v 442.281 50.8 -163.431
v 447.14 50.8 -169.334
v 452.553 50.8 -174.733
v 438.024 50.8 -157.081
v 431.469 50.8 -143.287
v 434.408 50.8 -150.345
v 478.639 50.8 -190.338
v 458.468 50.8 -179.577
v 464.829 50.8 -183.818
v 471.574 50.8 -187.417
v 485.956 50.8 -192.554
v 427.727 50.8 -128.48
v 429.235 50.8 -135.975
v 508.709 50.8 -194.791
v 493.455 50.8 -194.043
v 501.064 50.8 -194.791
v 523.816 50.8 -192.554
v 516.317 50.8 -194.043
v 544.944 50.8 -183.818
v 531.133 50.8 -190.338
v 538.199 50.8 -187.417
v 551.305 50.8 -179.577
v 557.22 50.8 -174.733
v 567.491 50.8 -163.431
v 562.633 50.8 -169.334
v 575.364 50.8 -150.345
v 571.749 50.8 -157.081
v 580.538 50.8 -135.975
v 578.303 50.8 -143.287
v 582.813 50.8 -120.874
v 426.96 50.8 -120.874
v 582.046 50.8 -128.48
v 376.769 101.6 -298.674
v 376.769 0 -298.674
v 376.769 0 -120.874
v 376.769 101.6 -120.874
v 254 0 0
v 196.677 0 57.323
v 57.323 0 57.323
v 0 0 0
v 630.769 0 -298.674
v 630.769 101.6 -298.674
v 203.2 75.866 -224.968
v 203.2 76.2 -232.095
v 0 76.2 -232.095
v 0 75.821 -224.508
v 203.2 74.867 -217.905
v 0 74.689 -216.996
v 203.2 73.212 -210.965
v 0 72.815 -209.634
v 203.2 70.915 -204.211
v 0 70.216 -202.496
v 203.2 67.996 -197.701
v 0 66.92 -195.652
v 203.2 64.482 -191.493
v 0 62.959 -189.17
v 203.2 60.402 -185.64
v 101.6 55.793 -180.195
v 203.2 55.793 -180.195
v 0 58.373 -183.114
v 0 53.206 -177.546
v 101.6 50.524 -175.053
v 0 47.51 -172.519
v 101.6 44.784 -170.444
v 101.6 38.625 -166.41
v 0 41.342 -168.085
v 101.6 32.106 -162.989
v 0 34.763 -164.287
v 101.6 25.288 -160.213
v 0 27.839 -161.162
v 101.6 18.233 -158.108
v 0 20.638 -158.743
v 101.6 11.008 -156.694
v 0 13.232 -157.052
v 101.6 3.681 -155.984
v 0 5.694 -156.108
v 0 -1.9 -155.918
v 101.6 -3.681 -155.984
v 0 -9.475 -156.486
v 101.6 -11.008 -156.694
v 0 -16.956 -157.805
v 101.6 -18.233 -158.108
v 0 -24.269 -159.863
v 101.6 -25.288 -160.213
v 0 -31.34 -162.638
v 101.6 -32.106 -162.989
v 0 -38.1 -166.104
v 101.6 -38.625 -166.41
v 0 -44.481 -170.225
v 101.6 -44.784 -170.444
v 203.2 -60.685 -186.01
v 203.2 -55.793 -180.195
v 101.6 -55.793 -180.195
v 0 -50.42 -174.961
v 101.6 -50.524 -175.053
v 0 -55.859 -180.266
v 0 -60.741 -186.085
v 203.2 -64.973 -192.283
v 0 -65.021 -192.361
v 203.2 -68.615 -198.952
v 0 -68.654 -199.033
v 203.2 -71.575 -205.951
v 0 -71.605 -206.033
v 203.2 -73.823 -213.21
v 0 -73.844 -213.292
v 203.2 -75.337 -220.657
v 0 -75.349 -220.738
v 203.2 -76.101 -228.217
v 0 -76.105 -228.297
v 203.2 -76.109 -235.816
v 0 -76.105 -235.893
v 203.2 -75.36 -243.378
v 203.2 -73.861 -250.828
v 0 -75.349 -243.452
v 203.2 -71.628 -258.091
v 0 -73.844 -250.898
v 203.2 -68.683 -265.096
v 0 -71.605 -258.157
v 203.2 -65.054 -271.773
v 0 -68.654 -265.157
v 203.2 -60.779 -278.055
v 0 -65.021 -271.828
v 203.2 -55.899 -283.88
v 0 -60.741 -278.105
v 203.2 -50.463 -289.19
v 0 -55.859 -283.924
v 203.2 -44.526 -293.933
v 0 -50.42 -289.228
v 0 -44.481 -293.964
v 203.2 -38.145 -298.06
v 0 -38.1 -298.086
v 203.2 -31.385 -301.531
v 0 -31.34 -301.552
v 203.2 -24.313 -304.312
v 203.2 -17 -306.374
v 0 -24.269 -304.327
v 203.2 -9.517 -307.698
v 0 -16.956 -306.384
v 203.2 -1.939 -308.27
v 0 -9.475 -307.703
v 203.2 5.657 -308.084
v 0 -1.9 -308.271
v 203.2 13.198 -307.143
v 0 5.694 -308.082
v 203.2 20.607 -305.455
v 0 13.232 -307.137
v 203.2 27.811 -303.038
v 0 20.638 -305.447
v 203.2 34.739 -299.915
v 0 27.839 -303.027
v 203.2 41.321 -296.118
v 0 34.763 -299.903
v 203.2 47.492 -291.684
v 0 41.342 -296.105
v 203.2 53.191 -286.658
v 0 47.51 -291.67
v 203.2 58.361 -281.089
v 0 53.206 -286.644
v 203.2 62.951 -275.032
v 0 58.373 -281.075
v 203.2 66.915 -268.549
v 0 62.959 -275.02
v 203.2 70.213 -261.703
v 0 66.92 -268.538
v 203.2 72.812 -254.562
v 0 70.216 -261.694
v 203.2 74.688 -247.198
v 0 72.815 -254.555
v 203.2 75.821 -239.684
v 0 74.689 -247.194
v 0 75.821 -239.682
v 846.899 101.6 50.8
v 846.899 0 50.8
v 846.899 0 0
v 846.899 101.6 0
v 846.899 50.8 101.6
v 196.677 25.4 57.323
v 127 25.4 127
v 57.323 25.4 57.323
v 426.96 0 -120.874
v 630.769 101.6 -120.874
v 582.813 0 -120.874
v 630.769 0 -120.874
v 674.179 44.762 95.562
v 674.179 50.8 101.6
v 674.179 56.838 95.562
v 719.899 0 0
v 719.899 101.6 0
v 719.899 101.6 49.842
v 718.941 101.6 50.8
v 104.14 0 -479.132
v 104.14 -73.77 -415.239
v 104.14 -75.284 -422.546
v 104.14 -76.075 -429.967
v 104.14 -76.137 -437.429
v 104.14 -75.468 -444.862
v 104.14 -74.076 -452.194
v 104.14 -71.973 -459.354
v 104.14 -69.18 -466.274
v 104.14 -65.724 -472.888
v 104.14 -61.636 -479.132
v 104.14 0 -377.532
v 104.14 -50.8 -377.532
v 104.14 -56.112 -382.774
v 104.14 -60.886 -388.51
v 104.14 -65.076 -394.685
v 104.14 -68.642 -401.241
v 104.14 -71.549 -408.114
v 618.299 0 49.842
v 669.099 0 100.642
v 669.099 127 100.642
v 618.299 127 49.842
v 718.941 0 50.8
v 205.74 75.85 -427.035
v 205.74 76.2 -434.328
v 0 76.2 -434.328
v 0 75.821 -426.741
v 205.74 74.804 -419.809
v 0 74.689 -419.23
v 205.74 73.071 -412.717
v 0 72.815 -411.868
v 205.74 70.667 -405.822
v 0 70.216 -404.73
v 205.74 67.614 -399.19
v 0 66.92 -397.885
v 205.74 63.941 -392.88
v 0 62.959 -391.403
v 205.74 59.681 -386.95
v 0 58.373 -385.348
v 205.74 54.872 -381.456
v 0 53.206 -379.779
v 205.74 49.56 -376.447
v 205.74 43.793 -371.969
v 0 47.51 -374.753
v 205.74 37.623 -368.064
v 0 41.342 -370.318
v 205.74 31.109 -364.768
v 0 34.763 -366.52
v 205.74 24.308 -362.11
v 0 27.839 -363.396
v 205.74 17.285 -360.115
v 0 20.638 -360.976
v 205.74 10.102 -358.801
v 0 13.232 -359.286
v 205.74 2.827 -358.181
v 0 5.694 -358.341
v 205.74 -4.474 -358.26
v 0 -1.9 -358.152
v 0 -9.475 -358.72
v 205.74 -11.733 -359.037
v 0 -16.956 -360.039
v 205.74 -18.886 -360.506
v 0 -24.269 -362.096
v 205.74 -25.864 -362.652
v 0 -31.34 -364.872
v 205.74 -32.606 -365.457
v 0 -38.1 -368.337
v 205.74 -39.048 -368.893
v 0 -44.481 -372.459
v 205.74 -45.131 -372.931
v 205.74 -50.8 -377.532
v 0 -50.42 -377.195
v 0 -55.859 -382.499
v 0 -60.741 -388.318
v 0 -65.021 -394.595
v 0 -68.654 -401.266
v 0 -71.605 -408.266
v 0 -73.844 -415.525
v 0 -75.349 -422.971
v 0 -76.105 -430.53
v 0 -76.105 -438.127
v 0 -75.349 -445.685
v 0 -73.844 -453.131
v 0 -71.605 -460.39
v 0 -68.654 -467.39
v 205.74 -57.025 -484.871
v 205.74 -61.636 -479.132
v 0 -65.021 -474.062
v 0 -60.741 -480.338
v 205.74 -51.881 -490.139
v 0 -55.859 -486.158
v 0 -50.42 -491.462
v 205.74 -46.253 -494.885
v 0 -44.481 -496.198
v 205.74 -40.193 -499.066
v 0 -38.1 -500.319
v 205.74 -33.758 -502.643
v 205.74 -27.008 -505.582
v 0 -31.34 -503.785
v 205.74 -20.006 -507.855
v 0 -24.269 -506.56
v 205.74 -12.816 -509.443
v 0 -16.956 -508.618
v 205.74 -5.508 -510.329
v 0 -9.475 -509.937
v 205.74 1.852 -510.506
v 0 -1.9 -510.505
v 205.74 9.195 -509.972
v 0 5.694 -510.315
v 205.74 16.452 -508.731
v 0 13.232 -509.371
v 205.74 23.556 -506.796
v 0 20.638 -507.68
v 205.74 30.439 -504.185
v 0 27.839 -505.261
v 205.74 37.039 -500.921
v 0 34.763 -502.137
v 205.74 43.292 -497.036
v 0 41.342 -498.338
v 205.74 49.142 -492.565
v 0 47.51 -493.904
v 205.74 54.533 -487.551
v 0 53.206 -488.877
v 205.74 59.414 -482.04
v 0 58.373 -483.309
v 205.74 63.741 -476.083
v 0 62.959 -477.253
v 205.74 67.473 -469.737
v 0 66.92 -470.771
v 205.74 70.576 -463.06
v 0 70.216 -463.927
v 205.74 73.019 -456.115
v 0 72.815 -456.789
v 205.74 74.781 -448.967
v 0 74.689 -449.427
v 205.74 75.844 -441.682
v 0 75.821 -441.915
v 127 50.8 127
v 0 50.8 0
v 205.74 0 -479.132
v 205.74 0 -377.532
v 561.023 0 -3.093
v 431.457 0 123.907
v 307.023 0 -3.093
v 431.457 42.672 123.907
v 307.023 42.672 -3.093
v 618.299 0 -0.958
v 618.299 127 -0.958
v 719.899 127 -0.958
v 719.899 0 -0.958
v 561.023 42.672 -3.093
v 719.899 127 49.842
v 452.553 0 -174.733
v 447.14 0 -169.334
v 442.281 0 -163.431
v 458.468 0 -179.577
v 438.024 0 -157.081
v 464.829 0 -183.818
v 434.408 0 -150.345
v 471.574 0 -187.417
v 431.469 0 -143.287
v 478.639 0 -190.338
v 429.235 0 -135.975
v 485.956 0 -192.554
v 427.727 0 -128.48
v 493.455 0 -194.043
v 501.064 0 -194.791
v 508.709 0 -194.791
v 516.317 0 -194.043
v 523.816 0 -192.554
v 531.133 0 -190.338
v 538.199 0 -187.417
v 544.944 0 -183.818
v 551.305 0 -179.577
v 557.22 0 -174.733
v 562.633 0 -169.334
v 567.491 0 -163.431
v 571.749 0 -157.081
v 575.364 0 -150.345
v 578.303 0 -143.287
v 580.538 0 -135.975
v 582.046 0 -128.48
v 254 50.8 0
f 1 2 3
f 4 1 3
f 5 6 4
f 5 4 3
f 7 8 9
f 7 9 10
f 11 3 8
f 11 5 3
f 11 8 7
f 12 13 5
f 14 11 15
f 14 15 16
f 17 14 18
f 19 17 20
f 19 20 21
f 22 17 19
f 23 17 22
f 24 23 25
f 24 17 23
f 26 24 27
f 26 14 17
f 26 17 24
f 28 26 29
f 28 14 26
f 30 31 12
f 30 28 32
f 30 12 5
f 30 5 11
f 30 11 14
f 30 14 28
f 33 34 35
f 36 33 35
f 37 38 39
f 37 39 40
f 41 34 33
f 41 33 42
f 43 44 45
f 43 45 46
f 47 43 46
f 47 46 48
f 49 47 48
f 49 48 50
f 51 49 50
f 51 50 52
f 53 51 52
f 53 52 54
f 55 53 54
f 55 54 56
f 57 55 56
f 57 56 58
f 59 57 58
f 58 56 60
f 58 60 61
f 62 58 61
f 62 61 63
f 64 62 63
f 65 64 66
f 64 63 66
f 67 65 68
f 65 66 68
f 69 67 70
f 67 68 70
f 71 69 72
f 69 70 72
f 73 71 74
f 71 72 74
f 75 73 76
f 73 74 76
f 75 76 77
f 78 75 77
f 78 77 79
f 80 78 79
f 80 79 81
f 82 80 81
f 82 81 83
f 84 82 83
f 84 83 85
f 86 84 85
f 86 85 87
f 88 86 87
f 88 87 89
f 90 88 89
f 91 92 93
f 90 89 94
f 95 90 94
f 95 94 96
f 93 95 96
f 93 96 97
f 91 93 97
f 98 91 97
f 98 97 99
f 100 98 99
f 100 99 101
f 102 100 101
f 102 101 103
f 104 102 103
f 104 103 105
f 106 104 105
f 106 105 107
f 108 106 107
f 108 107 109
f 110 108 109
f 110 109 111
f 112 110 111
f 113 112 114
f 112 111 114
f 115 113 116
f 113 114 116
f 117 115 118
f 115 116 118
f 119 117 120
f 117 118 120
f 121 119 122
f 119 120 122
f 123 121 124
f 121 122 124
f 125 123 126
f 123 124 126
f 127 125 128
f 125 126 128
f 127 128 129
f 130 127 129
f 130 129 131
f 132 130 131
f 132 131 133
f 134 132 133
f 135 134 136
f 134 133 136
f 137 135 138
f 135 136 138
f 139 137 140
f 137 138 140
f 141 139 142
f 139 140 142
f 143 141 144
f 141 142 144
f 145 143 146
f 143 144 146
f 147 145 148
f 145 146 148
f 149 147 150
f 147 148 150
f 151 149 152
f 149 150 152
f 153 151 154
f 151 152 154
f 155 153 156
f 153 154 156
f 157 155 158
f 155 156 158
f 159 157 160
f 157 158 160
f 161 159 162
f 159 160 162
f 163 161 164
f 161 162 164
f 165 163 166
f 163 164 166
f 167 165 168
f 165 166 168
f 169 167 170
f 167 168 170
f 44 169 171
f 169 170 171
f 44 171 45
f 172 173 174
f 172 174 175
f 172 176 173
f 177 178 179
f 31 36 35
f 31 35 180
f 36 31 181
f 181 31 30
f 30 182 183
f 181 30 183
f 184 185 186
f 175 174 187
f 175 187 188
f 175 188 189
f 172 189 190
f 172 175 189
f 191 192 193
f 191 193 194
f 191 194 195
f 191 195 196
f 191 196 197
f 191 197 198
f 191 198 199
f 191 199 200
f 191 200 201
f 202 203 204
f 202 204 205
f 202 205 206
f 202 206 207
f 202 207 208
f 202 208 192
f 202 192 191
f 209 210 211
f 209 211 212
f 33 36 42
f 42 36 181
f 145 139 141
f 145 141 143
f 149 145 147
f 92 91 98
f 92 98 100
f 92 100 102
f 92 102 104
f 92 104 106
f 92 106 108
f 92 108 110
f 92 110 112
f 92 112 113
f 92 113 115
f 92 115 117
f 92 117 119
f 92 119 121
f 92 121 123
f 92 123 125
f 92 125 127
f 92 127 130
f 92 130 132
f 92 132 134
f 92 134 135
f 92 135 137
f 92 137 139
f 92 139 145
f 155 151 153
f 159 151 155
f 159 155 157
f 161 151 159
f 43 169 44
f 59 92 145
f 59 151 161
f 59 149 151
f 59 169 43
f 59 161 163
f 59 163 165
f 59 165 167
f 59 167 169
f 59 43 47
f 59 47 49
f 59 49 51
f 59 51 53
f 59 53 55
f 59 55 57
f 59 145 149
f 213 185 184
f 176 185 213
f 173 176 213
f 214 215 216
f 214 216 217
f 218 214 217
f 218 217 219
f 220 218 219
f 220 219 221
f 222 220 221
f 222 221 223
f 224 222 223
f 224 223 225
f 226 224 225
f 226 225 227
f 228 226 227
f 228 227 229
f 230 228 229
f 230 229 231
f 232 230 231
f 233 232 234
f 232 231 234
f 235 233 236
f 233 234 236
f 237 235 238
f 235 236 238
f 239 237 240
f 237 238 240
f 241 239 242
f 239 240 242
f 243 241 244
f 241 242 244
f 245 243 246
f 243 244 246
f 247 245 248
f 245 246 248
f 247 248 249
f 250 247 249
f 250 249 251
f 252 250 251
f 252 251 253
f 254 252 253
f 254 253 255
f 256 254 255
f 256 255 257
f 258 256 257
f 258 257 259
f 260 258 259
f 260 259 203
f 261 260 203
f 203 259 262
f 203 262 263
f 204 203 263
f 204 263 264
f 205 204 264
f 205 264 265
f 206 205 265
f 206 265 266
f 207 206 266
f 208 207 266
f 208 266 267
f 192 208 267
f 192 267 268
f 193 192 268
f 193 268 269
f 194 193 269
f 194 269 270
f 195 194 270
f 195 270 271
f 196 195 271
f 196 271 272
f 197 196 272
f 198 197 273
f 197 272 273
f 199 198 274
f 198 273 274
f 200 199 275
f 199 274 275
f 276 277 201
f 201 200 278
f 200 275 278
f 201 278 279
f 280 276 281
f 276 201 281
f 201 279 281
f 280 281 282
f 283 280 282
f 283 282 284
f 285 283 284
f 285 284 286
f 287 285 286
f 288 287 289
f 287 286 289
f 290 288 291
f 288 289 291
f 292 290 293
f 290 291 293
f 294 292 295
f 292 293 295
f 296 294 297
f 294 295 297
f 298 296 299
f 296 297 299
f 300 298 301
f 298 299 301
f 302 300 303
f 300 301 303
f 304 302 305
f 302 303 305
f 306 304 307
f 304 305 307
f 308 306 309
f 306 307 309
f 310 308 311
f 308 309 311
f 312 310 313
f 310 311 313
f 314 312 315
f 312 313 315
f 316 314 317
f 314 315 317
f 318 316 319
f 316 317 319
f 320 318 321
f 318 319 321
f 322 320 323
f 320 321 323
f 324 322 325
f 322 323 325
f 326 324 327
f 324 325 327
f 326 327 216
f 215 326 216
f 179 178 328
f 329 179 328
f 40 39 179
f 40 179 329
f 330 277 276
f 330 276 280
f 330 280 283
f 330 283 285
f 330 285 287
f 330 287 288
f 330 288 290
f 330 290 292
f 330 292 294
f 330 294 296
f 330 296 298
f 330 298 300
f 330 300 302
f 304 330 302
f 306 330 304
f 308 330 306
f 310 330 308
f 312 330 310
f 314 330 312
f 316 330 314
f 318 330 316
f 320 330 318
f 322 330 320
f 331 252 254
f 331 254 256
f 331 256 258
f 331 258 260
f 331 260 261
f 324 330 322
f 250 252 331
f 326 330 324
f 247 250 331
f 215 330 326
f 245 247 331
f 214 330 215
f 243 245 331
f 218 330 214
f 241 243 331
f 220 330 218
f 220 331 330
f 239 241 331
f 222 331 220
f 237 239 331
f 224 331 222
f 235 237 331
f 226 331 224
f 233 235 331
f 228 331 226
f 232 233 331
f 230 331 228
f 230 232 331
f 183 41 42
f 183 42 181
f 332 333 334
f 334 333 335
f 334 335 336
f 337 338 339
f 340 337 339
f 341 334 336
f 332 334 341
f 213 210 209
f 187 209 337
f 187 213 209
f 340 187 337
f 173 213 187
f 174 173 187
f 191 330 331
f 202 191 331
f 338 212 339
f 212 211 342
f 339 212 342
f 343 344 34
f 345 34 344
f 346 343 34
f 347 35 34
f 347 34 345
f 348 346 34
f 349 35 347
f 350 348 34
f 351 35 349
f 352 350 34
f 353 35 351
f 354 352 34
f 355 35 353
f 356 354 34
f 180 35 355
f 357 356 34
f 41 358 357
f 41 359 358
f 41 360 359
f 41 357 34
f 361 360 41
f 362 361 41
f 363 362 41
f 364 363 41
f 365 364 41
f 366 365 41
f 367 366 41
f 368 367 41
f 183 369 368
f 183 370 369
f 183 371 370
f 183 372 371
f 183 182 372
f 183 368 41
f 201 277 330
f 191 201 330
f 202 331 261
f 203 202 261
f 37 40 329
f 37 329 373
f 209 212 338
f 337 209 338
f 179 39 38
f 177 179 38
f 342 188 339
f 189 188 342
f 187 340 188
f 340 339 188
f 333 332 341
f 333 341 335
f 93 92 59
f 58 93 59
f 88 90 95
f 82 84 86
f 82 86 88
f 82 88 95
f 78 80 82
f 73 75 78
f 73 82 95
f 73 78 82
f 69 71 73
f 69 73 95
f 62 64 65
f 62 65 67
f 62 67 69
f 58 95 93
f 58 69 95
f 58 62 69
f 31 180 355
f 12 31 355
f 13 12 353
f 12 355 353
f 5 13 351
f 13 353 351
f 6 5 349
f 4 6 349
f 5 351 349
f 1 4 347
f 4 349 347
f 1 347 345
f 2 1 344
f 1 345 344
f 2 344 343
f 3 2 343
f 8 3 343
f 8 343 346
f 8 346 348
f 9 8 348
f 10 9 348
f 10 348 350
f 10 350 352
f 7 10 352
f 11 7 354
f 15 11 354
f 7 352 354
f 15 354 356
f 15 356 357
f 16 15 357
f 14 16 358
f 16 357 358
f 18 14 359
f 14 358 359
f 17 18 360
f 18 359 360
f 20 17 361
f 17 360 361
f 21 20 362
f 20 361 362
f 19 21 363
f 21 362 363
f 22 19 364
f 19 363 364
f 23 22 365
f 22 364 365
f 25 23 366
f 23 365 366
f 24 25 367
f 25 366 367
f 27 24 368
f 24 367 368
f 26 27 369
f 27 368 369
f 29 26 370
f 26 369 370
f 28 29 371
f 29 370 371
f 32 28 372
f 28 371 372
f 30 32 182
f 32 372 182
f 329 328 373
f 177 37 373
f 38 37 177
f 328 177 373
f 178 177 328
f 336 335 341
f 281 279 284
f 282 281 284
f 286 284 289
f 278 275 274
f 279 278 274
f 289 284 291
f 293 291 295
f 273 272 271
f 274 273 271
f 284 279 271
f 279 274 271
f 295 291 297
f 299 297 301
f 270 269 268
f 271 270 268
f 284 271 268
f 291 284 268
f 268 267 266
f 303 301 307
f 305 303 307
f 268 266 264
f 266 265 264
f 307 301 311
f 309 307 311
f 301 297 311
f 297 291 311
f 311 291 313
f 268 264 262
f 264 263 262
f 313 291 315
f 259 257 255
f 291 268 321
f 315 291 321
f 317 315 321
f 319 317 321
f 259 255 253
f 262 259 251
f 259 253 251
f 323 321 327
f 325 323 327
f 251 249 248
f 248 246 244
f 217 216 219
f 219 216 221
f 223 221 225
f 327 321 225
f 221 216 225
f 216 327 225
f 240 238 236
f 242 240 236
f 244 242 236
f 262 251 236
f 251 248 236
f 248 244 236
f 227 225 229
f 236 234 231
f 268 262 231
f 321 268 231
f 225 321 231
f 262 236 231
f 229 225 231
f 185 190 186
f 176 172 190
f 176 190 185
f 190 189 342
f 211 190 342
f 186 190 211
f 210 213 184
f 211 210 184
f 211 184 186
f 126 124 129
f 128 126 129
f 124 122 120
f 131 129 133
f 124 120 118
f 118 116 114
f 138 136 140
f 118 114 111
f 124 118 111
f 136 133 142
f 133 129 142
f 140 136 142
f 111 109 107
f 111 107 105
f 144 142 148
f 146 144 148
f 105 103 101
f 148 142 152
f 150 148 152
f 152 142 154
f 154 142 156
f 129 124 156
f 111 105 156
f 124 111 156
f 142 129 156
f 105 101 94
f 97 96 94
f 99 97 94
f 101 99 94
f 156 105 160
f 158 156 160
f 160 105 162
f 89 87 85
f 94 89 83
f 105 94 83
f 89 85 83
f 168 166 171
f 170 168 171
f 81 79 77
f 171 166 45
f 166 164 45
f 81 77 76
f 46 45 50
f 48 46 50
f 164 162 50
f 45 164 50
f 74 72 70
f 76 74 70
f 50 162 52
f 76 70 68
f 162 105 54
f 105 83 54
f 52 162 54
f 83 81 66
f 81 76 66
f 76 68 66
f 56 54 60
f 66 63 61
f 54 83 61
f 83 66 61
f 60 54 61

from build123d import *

# Parameters (mm, degrees)
F1_DEPTH  = 50.8
F3_DEPTH  = 25.4
F5_DEPTH  = 42.672
F7_DEPTH  = 127
F10_DEPTH = 127
F11_DEPTH = 45.72
F12_R     = 76.2
F13_DEPTH = 203.2
F15_DEPTH = 101.6
F16_R     = 76.2
F17_DEPTH = 205.74
F19_DEPTH = 101.6
F20_W     = 254
F20_H     = 177.8
F21_DEPTH = 101.6
F23_DEPTH = 50.8


with BuildPart() as f1:
    # F0 (on Front) → F1 (new body)
    with BuildSketch(Plane.XZ):
        Polygon((127, 127), (0, 0), (254, 0), align=None)
    extrude(amount=-F1_DEPTH)

    # F2 (on face) → F3 (cut)
    with BuildSketch(Plane.XZ):
        Polygon((127, 127), (57.3232648172, 57.3232648172), (196.6767351828, 57.3232648172), align=None)
    extrude(amount=-F3_DEPTH, mode=Mode.SUBTRACT)


with BuildPart() as f5:
    # F4 (on Front) → F5 (new body)
    with BuildSketch(Plane.XZ):
        Polygon((431.4572305207, 123.9073670745), (307.0231515873, -3.0926329255), (561.0231515873, -3.0926329255), align=None)
    extrude(amount=-F5_DEPTH)


with BuildPart() as f7:
    # F6 (on Front) → F7 (new body)
    with BuildSketch(Plane.XZ):
        Polygon((618.2994227751, 49.8416927981), (618.2994227751, -0.9583072019), (719.8994227751, -0.9583072019), (719.8994227751, 49.8416927981), (669.0994226487, 100.6416927981), align=None)
    extrude(amount=-F7_DEPTH)

    # F9 (on offset) → F10 (join, through all)
    with BuildSketch(Plane.YZ.offset(846.8994227751)):
        Polygon((0, 50.8), (0, 0), (101.6, 0), (101.6, 50.8), (50.8, 101.599995519), align=None)
    extrude(amount=-F10_DEPTH)

    # F11 (add): a face of the model
    f11_faces = [f7.faces().sort_by_distance(p)[0] for p in [
        (719.8994227751, 50.8, 67.100267224),
    ]]
    extrude(f11_faces, amount=F11_DEPTH)


with BuildPart() as f13:
    # F12 (on Right) → F13 (new body)
    with BuildSketch(Plane.YZ):
        with Locations((0, -232.0947945118)):
            Circle(F12_R)
    extrude(amount=F13_DEPTH)

    # F14 (on face) → F15 (cut)
    with BuildSketch(Plane.YZ.offset(203.2)):
        with BuildLine():
            ThreePointArc((55.7926841618, -180.1947329124), (0, -155.8947945118), (-55.7926841618, -180.1947329124))
            Line((-55.7926841618, -180.1947329124), (55.7926841618, -180.1947329124))
        make_face()
    extrude(amount=-F15_DEPTH, mode=Mode.SUBTRACT)


with BuildPart() as f17:
    # F16 (on Right) → F17 (new body)
    with BuildSketch(Plane.YZ):
        with Locations((0, -434.3283474445)):
            Circle(F16_R)
    extrude(amount=F17_DEPTH)

    # F18 (on face) → F19 (cut)
    with BuildSketch(Plane.YZ.offset(205.74)):
        with BuildLine():
            Line((0, -377.532220816), (-50.8, -377.532220816))
            ThreePointArc((-50.8, -377.532220816), (-75.7702399429, -426.2468414591), (-61.6364578063, -479.132220816))
            Line((-61.6364578063, -479.132220816), (0, -479.132220816))
            Line((0, -479.132220816), (0, -377.532220816))
        make_face()
    extrude(amount=-F19_DEPTH, mode=Mode.SUBTRACT)


with BuildPart() as f21:
    # F20 (on Front) → F21 (new body)
    with BuildSketch(Plane.XZ):
        with Locations((503.7685334682, -209.7737226661)):
            Rectangle(F20_W, F20_H)
    extrude(amount=-F21_DEPTH)

    # F22 (on face) → F23 (cut)
    with BuildSketch(Plane.XZ):
        with BuildLine():
            Line((582.8130320883, -120.8737226661), (426.9595070505, -120.8737226661))
            ThreePointArc((426.9595070505, -120.8737226661), (504.8862695694, -194.8849174745), (582.8130320883, -120.8737226661))
        make_face()
    extrude(amount=-F23_DEPTH, mode=Mode.SUBTRACT)


solid = Compound([f1.part, f5.part, f7.part, f13.part, f17.part, f21.part])
